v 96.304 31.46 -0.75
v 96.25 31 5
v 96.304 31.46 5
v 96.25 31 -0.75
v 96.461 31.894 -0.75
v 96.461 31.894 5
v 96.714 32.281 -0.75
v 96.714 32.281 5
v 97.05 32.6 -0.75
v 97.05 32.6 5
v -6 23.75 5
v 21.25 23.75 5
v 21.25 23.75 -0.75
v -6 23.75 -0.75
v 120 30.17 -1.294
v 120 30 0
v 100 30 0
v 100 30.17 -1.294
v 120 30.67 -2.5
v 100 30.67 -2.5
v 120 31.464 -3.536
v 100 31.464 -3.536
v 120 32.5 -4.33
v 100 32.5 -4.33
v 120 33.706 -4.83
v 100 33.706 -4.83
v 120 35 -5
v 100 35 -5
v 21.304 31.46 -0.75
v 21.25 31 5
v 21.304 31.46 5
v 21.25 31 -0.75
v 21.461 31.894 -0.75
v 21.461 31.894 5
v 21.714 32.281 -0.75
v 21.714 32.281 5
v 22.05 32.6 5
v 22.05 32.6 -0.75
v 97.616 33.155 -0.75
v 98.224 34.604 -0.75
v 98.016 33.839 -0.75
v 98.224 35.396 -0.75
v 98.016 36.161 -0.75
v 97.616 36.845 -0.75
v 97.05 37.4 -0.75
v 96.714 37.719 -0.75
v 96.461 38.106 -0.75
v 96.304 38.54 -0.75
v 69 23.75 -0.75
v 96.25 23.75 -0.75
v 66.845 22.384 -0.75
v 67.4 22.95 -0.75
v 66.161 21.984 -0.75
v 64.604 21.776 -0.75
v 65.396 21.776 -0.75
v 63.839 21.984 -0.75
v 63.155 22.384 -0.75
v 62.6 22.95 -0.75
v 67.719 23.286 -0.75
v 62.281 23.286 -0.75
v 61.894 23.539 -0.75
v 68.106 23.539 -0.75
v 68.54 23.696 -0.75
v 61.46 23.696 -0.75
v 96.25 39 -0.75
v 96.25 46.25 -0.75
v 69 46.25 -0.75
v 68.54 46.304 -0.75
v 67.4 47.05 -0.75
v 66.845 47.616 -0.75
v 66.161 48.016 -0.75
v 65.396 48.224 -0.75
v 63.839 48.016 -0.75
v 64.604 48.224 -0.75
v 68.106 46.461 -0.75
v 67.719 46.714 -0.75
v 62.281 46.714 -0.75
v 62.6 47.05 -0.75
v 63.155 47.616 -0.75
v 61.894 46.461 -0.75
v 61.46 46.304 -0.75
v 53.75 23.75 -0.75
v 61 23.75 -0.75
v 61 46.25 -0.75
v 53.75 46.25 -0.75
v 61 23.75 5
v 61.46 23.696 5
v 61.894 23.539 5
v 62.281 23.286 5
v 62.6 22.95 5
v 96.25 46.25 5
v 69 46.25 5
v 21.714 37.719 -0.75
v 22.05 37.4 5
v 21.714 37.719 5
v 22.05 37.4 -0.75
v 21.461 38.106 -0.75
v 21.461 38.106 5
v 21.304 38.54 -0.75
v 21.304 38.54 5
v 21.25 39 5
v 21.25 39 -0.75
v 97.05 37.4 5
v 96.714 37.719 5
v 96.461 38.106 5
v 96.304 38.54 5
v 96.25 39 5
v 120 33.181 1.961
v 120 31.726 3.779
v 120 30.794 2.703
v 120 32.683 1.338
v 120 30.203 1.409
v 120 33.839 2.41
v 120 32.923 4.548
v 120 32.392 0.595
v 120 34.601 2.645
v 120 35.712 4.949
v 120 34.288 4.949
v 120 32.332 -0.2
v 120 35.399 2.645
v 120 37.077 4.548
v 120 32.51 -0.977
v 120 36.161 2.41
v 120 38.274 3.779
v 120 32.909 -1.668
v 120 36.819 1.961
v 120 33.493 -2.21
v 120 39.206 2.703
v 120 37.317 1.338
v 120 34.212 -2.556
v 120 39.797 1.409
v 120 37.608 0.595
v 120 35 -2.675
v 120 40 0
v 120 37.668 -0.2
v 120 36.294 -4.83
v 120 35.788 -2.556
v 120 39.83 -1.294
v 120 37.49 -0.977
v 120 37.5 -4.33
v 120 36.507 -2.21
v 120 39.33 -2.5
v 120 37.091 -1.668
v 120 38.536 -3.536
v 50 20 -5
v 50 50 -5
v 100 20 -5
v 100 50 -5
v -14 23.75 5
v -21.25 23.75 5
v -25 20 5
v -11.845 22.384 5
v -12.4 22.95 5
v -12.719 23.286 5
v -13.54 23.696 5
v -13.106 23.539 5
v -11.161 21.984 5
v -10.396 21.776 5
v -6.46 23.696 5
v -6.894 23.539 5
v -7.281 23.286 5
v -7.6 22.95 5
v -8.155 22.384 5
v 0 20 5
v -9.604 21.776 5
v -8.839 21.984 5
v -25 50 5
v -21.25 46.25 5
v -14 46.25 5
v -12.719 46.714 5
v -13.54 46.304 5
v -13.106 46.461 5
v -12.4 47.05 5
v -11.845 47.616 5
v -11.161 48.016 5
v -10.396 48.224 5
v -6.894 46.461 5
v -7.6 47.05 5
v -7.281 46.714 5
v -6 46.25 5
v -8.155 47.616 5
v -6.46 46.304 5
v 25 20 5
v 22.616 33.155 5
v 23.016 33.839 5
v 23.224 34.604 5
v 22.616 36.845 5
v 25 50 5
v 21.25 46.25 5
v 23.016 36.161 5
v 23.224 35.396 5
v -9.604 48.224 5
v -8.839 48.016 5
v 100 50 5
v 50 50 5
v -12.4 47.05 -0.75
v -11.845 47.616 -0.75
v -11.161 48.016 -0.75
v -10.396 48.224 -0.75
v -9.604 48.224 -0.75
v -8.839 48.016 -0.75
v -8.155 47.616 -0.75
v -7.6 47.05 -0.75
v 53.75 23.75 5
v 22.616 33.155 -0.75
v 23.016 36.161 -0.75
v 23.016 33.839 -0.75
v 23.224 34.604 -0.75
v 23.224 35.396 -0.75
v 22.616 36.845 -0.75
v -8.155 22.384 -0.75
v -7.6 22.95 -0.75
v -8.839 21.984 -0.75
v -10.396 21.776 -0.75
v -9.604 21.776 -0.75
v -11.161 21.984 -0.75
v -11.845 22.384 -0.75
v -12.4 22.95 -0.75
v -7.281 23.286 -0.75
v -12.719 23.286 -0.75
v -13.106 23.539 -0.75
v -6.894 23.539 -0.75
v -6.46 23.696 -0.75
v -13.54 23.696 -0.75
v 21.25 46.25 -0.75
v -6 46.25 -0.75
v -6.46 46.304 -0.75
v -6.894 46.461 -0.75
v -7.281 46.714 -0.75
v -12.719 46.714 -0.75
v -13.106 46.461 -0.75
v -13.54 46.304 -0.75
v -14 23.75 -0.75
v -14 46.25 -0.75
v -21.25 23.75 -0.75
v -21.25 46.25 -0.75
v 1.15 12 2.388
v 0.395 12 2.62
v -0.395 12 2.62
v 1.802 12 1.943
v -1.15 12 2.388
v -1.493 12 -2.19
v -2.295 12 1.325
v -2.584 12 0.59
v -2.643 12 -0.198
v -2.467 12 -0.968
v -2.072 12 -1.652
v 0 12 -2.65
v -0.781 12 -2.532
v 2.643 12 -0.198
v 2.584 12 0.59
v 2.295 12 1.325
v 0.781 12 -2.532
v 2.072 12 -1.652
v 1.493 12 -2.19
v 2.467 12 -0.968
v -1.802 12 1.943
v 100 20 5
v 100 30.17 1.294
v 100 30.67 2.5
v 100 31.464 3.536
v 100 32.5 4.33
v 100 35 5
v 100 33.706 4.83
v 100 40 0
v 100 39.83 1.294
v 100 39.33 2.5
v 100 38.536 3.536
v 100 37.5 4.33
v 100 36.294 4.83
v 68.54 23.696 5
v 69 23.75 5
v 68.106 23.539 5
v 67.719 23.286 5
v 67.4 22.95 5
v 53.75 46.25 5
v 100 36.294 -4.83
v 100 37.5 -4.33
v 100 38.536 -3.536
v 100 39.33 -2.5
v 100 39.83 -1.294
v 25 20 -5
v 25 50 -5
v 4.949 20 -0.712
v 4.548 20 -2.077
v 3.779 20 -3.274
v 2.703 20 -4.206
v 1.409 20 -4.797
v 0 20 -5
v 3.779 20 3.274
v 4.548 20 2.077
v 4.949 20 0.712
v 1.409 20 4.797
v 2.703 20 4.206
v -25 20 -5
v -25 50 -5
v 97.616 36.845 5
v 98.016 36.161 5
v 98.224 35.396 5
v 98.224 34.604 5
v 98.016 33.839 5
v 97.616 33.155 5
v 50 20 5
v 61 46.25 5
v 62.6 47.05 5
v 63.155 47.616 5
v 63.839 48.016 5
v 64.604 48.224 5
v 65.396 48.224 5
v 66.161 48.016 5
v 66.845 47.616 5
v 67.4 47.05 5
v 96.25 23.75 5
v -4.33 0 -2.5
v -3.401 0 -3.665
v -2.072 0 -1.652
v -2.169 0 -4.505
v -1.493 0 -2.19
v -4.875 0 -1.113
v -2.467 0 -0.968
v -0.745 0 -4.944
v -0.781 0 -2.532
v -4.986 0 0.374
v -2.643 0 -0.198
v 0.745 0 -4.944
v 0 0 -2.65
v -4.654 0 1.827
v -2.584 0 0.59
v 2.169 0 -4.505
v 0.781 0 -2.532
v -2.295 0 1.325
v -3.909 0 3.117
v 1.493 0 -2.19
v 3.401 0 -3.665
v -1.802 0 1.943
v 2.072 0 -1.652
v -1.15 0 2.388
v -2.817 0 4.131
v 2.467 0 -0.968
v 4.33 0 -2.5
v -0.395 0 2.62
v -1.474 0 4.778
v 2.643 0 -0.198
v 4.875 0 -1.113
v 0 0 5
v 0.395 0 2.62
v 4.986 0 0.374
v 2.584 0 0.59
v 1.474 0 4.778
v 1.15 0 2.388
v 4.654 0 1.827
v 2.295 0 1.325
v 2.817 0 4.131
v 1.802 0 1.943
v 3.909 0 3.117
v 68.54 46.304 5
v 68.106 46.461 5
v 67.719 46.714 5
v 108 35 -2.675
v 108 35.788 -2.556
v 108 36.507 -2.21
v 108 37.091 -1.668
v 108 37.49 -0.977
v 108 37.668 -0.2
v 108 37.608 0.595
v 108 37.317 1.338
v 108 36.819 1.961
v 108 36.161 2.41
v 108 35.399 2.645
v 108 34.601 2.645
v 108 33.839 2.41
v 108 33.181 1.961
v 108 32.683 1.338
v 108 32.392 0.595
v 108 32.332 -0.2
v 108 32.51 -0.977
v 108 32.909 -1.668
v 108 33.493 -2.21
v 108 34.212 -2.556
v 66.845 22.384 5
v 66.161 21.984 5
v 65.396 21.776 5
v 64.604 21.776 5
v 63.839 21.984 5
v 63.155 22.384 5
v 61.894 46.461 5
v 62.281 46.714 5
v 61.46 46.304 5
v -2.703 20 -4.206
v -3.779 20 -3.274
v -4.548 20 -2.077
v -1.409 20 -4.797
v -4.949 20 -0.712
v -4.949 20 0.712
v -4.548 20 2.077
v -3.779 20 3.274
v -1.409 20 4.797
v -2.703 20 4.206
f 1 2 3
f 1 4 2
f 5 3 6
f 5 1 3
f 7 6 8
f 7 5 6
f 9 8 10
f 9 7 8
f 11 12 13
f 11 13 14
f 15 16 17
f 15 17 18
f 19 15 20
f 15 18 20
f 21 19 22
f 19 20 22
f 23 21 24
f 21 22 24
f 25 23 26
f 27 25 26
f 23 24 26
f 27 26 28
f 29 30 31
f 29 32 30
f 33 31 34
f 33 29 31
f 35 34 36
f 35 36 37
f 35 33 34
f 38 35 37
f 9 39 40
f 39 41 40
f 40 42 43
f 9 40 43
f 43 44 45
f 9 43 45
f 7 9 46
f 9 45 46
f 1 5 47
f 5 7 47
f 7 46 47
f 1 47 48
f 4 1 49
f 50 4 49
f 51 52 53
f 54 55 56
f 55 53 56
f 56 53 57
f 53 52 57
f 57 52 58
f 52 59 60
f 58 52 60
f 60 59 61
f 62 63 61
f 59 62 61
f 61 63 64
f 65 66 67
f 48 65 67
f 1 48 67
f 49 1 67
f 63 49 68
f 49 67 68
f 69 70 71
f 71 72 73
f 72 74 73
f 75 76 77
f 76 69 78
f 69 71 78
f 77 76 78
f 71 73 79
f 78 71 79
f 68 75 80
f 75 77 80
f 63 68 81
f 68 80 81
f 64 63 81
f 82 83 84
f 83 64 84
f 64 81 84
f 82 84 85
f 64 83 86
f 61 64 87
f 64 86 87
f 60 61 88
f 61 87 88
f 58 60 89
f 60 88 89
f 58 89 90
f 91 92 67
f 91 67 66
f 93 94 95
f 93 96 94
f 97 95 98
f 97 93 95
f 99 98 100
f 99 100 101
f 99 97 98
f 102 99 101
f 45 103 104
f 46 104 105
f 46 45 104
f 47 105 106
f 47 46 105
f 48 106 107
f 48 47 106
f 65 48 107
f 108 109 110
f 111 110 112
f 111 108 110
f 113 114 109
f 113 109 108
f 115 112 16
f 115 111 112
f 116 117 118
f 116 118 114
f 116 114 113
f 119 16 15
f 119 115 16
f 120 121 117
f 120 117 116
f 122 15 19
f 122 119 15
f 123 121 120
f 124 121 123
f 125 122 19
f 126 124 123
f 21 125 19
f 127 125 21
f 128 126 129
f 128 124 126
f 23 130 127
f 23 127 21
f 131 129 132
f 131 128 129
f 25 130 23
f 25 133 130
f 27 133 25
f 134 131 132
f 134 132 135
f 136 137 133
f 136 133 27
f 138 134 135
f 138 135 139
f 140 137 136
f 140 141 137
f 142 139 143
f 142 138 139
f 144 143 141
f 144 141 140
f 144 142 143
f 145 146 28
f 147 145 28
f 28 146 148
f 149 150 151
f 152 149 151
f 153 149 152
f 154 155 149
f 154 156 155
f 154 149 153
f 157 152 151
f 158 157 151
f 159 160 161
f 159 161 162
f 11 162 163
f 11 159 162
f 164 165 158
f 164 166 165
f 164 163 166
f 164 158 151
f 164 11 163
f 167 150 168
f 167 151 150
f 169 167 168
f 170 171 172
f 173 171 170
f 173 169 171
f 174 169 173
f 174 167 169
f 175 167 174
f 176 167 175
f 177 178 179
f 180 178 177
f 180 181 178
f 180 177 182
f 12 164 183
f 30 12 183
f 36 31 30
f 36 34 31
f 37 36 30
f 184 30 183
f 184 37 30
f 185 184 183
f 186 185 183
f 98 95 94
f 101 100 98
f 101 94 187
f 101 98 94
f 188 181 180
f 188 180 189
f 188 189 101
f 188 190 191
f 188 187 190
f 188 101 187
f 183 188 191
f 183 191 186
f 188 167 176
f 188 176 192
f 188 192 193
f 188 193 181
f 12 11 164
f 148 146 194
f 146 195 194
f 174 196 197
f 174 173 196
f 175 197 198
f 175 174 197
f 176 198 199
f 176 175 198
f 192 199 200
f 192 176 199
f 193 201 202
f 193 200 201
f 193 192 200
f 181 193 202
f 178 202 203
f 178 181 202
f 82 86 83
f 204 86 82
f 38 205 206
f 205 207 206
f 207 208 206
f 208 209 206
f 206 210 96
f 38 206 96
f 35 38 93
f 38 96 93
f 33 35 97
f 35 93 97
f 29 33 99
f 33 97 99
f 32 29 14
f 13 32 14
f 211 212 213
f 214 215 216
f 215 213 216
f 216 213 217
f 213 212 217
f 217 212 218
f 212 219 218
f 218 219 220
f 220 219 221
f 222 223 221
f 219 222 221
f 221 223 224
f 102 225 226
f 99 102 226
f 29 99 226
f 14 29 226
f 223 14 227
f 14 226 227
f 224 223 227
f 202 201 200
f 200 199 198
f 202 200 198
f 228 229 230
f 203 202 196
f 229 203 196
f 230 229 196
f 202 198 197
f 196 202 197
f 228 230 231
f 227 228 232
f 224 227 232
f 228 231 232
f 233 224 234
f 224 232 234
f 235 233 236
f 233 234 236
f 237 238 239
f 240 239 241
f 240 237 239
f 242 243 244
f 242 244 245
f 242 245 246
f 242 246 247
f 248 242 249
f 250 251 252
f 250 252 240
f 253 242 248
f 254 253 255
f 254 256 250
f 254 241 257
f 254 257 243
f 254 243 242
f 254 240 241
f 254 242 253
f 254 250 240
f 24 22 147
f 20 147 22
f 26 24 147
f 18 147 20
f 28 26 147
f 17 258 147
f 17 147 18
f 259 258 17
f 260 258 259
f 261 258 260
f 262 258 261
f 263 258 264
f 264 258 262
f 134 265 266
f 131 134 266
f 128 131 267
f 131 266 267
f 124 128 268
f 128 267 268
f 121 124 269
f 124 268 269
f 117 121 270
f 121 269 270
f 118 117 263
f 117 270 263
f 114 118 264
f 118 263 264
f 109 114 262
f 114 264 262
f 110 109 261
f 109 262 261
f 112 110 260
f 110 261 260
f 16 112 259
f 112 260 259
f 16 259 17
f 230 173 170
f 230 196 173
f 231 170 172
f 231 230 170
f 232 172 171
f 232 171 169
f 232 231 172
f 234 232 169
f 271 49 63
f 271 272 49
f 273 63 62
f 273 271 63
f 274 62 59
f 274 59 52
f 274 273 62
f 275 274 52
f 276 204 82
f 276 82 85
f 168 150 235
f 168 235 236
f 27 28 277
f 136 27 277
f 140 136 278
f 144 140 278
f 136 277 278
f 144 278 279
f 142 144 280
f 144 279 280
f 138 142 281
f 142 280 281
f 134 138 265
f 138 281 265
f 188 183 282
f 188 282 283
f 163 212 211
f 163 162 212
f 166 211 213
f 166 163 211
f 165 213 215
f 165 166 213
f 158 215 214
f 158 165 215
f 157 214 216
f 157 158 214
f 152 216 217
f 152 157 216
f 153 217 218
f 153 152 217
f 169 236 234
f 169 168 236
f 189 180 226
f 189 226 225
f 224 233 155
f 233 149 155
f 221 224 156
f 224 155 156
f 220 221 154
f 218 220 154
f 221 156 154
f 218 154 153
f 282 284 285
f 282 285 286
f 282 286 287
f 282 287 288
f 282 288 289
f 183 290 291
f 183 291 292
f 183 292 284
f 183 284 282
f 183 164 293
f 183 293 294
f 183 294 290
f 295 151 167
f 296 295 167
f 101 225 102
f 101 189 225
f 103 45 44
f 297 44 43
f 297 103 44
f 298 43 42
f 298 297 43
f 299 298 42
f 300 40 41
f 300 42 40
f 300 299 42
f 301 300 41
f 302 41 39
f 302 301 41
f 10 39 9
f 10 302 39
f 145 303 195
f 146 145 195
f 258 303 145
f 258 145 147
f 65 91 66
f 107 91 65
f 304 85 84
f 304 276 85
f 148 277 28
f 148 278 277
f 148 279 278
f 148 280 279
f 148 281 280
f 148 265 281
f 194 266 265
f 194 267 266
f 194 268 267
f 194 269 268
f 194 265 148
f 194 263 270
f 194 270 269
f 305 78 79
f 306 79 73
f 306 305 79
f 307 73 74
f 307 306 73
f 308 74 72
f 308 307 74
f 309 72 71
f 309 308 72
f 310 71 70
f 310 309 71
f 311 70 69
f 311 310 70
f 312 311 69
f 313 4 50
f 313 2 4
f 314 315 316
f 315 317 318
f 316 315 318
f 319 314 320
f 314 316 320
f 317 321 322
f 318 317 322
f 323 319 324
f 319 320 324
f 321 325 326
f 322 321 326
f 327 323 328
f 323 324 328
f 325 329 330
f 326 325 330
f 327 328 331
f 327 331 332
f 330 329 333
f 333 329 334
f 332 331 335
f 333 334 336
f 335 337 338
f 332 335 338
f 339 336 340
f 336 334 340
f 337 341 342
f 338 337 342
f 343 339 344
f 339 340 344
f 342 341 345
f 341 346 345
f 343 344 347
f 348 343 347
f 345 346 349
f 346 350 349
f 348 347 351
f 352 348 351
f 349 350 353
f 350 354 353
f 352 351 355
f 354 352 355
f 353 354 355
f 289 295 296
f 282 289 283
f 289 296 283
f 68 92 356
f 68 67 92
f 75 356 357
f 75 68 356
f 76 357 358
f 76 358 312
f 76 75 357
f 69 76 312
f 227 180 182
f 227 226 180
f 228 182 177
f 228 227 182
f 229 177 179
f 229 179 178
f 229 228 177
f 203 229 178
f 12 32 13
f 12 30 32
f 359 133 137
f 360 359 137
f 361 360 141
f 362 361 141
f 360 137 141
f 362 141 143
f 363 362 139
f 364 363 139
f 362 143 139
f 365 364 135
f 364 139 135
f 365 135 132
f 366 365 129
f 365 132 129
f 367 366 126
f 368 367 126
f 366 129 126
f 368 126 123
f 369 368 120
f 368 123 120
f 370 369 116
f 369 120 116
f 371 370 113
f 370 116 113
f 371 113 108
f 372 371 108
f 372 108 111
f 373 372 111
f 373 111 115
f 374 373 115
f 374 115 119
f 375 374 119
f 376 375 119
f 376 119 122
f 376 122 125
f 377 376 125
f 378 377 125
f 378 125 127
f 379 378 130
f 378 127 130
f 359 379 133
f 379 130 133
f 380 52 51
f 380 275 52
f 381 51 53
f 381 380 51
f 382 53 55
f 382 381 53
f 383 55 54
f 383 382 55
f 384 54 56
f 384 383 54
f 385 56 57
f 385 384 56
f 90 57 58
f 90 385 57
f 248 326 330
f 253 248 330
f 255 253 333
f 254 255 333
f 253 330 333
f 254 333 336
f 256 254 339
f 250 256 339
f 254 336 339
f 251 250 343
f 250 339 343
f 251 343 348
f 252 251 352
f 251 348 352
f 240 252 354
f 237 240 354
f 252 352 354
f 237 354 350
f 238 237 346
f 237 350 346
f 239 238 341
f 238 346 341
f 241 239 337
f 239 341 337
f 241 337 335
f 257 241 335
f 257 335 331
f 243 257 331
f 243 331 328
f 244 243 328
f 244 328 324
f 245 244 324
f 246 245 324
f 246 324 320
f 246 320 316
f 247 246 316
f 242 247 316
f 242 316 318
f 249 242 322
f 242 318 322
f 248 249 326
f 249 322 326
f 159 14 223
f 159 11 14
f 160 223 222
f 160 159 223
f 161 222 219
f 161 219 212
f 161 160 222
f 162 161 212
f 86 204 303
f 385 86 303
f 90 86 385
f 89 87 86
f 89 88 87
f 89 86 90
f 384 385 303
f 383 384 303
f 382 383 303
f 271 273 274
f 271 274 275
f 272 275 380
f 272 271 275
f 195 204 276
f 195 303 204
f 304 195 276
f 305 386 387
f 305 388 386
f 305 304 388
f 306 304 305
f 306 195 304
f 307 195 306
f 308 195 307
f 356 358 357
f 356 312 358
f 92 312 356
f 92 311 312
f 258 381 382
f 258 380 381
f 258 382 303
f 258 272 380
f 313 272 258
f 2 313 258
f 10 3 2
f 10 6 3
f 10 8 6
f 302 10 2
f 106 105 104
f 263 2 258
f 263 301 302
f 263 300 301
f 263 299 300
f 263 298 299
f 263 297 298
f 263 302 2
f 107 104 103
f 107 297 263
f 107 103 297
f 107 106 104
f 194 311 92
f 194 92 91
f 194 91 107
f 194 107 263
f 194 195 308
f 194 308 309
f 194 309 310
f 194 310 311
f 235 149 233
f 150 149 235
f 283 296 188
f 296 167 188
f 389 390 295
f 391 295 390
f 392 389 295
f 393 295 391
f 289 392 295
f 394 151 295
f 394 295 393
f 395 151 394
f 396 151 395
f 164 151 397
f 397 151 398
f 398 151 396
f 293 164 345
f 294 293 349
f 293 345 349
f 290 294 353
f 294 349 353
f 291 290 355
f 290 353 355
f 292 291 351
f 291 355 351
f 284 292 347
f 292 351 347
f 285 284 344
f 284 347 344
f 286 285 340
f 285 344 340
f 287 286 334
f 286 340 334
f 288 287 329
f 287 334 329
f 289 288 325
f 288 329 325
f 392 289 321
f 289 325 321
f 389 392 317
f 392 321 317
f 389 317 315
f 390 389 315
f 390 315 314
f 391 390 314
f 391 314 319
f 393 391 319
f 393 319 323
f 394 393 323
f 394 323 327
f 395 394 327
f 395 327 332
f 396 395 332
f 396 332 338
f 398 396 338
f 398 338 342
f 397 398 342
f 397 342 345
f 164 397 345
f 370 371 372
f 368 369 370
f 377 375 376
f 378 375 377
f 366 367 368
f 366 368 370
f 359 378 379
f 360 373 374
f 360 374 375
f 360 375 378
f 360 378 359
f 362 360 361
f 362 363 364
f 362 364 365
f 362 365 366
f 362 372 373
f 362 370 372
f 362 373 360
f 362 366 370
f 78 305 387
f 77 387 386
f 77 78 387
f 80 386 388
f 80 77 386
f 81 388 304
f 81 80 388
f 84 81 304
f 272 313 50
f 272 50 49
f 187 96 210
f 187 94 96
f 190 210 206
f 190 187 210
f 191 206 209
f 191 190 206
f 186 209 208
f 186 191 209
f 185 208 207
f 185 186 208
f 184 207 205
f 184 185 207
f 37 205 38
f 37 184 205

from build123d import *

# Parameters (mm, degrees)
SKETCH1_R           = 5
BOSS_EXTRUDE1_DEPTH = 20
SKETCH2_R           = 2.65
CUT_EXTRUDE1_DEPTH  = 12
SKETCH7_W           = 50
SKETCH7_H           = 30
BOSS_EXTRUDE4_DEPTH = 5
CUT_EXTRUDE2_DEPTH  = 0.75
CUT_EXTRUDE3_START  = 12
SKETCH8_3_R         = 1
CUT_EXTRUDE3_DEPTH  = 12
BOSS_EXTRUDE5_DEPTH = 20
SKETCH10_R          = 2.675
CUT_EXTRUDE4_DEPTH  = 12
SKETCH11_W          = 10
SKETCH11_H          = 20
CUT_EXTRUDE5_DEPTH  = 40
FILLET1_R           = 2
FILLET2_R           = 2


with BuildPart() as part:
    # Sketch1 → Boss-Extrude1 (new body)
    with BuildSketch(Plane(origin=(0, 0, 0), x_dir=(1, 0, 0), z_dir=(0, 1, 0))):
        with Locations(Location((0, 0, 0), (0, 0, 270))):
            Circle(SKETCH1_R)
    extrude(amount=BOSS_EXTRUDE1_DEPTH)

    # Sketch2 → Cut-Extrude1 (cut)
    with BuildSketch(Plane.XZ):
        with Locations(Location((0, 0, 0), (0, 0, 270))):
            Circle(SKETCH2_R)
    extrude(amount=-CUT_EXTRUDE1_DEPTH, mode=Mode.SUBTRACT)

    # Sketch7 → Boss-Extrude4 (add, symmetric)
    with BuildSketch(Plane.XY):
        with Locations((0, 35)):
            Rectangle(SKETCH7_W, SKETCH7_H)
    extrude(amount=BOSS_EXTRUDE4_DEPTH, both=True)

    # Sketch8 → Cut-Extrude2 (cut, symmetric)
    # profile 1 of 2: a face of its own
    with BuildSketch(Plane.XY):
        with BuildLine():
            Line((-21.25, 23.75), (-12.828427125, 23.75))
            ThreePointArc((-12.828427125, 23.75), (-10, 21.75), (-7.171572875, 23.75))
            Line((-7.171572875, 23.75), (10, 23.75))
            Line((10, 23.75), (21.25, 23.75))
            Line((21.25, 23.75), (21.25, 32.171572875))
            ThreePointArc((21.25, 32.171572875), (23.25, 35), (21.25, 37.828427125))
            Line((21.25, 37.828427125), (21.25, 46.25))
            Line((21.25, 46.25), (10, 46.25))
            Line((10, 46.25), (-7.171572875, 46.25))
            ThreePointArc((-7.171572875, 46.25), (-10, 48.25), (-12.828427125, 46.25))
            Line((-12.828427125, 46.25), (-21.25, 46.25))
            Line((-21.25, 46.25), (-21.25, 23.75))
        make_face()
        with BuildLine():
            Line((12, 24.75), (20.25, 24.75))
            Line((20.25, 24.75), (20.25, 33))
            ThreePointArc((20.25, 33), (22.25, 35), (20.25, 37))
            Line((20.25, 37), (20.25, 45.25))
            Line((20.25, 45.25), (12, 45.25))
            ThreePointArc((12, 45.25), (10, 43.25), (8, 45.25))
            Line((8, 45.25), (-8, 45.25))
            ThreePointArc((-8, 45.25), (-10, 47.25), (-12, 45.25))
            Line((-12, 45.25), (-20.25, 45.25))
            Line((-20.25, 45.25), (-20.25, 24.75))
            Line((-20.25, 24.75), (-12, 24.75))
            ThreePointArc((-12, 24.75), (-10, 22.75), (-8, 24.75))
            Line((-8, 24.75), (8, 24.75))
            ThreePointArc((8, 24.75), (10, 26.75), (12, 24.75))
        make_face(mode=Mode.SUBTRACT)
    # profile 2 of 2: a face of its own
    with BuildSketch(Plane.XY):
        with BuildLine():
            ThreePointArc((12, 24.75), (10, 26.75), (8, 24.75))
            Line((8, 24.75), (-8, 24.75))
            ThreePointArc((-8, 24.75), (-10, 22.75), (-12, 24.75))
            Line((-12, 24.75), (-20.25, 24.75))
            Line((-20.25, 24.75), (-20.25, 45.25))
            Line((-20.25, 45.25), (-12, 45.25))
            ThreePointArc((-12, 45.25), (-10, 47.25), (-8, 45.25))
            Line((-8, 45.25), (8, 45.25))
            ThreePointArc((8, 45.25), (10, 43.25), (12, 45.25))
            Line((12, 45.25), (20.25, 45.25))
            Line((20.25, 45.25), (20.25, 37))
            ThreePointArc((20.25, 37), (22.25, 35), (20.25, 33))
            Line((20.25, 33), (20.25, 24.75))
            Line((20.25, 24.75), (12, 24.75))
        make_face()
    extrude(amount=CUT_EXTRUDE2_DEPTH, both=True, mode=Mode.SUBTRACT)

    # Sketch8<3> → Cut-Extrude3 (cut)
    with BuildSketch(Plane.XY.offset(CUT_EXTRUDE3_START)):
        with BuildLine():
            Line((-21.25, 46.25), (-12.828427125, 46.25))
            ThreePointArc((-12.828427125, 46.25), (-10, 48.25), (-7.171572875, 46.25))
            Line((-7.171572875, 46.25), (10, 46.25))
            Line((10, 46.25), (21.25, 46.25))
            Line((21.25, 46.25), (21.25, 37.828427125))
            ThreePointArc((21.25, 37.828427125), (23.25, 35), (21.25, 32.171572875))
            Line((21.25, 32.171572875), (21.25, 23.75))
            Line((21.25, 23.75), (10, 23.75))
            Line((10, 23.75), (-7.171572875, 23.75))
            ThreePointArc((-7.171572875, 23.75), (-10, 21.75), (-12.828427125, 23.75))
            Line((-12.828427125, 23.75), (-21.25, 23.75))
            Line((-21.25, 23.75), (-21.25, 46.25))
        make_face()
        with Locations((10, 45.25)):
            Circle(SKETCH8_3_R, mode=Mode.SUBTRACT)
        with Locations((10, 24.75)):
            Circle(SKETCH8_3_R, mode=Mode.SUBTRACT)
    extrude(amount=-CUT_EXTRUDE3_DEPTH, mode=Mode.SUBTRACT)


with BuildPart() as cut_extrude3_kept_piece:
    # of the separate pieces the step leaves, the one the design keeps (cut_extrude3_pieces_kept)
    add(part.part.solids().sort_by_distance((-21.25, 23.75, -0.75))[0])


with BuildPart() as body_2:
    # Body-Move/Copy1: copy of Cut-Extrude3 kept piece
    add(cut_extrude3_kept_piece.part.moved(Location((75, 0, 0))))

    # Sketch9 → Boss-Extrude5 (add)
    with BuildSketch(Plane(origin=(100, 0, 0), x_dir=(0, 0, -1), z_dir=(1, 0, 0))):
        with BuildLine():
            ThreePointArc((2.675, 35), (1.89151064, 36.89151064), (0, 37.675))
            Line((0, 37.675), (0, 32.325))
            ThreePointArc((0, 32.325), (1.89151064, 33.10848936), (2.675, 35))
        make_face()
        with BuildLine():
            Line((0, 32.325), (0, 37.675))
            ThreePointArc((0, 37.675), (-2.675, 35), (0, 32.325))
        make_face()
        with BuildLine():
            ThreePointArc((5, 35), (3.535533906, 38.535533906), (0, 40))
            Line((0, 40), (0, 37.675))
            ThreePointArc((0, 37.675), (1.89151064, 36.89151064), (2.675, 35))
            ThreePointArc((2.675, 35), (1.89151064, 33.10848936), (0, 32.325))
            Line((0, 32.325), (0, 30))
            ThreePointArc((0, 30), (3.535533906, 31.464466094), (5, 35))
        make_face()
        with BuildLine():
            Line((0, 37.675), (0, 40))
            ThreePointArc((0, 40), (-5, 35), (0, 30))
            Line((0, 30), (0, 32.325))
            ThreePointArc((0, 32.325), (-2.675, 35), (0, 37.675))
        make_face()
    extrude(amount=BOSS_EXTRUDE5_DEPTH)

    # Sketch10 → Cut-Extrude4 (cut)
    with BuildSketch(Plane(origin=(120, 0, 0), x_dir=(0, 0, -1), z_dir=(1, 0, 0))):
        with Locations((0, 35)):
            Circle(SKETCH10_R)
    extrude(amount=-CUT_EXTRUDE4_DEPTH, mode=Mode.SUBTRACT)

    # Sketch11 → Cut-Extrude5 (cut)
    with BuildSketch(Plane(origin=(100, 0, 0), x_dir=(0, 0, -1), z_dir=(1, 0, 0))):
        with Locations((0, 10)):
            Rectangle(SKETCH11_W, SKETCH11_H)
    extrude(amount=-CUT_EXTRUDE5_DEPTH, mode=Mode.SUBTRACT)

    # Fillet2
    fillet2_edges = [body_2.edges().sort_by_distance(p)[0] for p in [
        (62.171572875, 46.25, 2.125),
        (67.828427125, 46.25, 2.125),
        (96.25, 37.828427125, 2.125),
        (96.25, 32.171572875, 2.125),
        (67.828427125, 23.75, 2.125),
        (62.171572875, 23.75, 2.125),
    ]]
    fillet(fillet2_edges, radius=FILLET2_R)


with BuildPart() as cut_extrude3_kept_piece_1:
    add(cut_extrude3_kept_piece.part)

    # Fillet1
    fillet1_edges = [cut_extrude3_kept_piece_1.edges().sort_by_distance(p)[0] for p in [
        (-12.828427125, 46.25, 2.125),
        (-7.171572875, 46.25, 2.875),
        (21.25, 37.828427125, 2.125),
        (21.25, 32.171572875, 2.125),
        (-7.171572875, 23.75, 2.125),
        (-12.828427125, 23.75, 2.125),
    ]]
    fillet(fillet1_edges, radius=FILLET1_R)


solid = Compound([body_2.part, cut_extrude3_kept_piece_1.part])
